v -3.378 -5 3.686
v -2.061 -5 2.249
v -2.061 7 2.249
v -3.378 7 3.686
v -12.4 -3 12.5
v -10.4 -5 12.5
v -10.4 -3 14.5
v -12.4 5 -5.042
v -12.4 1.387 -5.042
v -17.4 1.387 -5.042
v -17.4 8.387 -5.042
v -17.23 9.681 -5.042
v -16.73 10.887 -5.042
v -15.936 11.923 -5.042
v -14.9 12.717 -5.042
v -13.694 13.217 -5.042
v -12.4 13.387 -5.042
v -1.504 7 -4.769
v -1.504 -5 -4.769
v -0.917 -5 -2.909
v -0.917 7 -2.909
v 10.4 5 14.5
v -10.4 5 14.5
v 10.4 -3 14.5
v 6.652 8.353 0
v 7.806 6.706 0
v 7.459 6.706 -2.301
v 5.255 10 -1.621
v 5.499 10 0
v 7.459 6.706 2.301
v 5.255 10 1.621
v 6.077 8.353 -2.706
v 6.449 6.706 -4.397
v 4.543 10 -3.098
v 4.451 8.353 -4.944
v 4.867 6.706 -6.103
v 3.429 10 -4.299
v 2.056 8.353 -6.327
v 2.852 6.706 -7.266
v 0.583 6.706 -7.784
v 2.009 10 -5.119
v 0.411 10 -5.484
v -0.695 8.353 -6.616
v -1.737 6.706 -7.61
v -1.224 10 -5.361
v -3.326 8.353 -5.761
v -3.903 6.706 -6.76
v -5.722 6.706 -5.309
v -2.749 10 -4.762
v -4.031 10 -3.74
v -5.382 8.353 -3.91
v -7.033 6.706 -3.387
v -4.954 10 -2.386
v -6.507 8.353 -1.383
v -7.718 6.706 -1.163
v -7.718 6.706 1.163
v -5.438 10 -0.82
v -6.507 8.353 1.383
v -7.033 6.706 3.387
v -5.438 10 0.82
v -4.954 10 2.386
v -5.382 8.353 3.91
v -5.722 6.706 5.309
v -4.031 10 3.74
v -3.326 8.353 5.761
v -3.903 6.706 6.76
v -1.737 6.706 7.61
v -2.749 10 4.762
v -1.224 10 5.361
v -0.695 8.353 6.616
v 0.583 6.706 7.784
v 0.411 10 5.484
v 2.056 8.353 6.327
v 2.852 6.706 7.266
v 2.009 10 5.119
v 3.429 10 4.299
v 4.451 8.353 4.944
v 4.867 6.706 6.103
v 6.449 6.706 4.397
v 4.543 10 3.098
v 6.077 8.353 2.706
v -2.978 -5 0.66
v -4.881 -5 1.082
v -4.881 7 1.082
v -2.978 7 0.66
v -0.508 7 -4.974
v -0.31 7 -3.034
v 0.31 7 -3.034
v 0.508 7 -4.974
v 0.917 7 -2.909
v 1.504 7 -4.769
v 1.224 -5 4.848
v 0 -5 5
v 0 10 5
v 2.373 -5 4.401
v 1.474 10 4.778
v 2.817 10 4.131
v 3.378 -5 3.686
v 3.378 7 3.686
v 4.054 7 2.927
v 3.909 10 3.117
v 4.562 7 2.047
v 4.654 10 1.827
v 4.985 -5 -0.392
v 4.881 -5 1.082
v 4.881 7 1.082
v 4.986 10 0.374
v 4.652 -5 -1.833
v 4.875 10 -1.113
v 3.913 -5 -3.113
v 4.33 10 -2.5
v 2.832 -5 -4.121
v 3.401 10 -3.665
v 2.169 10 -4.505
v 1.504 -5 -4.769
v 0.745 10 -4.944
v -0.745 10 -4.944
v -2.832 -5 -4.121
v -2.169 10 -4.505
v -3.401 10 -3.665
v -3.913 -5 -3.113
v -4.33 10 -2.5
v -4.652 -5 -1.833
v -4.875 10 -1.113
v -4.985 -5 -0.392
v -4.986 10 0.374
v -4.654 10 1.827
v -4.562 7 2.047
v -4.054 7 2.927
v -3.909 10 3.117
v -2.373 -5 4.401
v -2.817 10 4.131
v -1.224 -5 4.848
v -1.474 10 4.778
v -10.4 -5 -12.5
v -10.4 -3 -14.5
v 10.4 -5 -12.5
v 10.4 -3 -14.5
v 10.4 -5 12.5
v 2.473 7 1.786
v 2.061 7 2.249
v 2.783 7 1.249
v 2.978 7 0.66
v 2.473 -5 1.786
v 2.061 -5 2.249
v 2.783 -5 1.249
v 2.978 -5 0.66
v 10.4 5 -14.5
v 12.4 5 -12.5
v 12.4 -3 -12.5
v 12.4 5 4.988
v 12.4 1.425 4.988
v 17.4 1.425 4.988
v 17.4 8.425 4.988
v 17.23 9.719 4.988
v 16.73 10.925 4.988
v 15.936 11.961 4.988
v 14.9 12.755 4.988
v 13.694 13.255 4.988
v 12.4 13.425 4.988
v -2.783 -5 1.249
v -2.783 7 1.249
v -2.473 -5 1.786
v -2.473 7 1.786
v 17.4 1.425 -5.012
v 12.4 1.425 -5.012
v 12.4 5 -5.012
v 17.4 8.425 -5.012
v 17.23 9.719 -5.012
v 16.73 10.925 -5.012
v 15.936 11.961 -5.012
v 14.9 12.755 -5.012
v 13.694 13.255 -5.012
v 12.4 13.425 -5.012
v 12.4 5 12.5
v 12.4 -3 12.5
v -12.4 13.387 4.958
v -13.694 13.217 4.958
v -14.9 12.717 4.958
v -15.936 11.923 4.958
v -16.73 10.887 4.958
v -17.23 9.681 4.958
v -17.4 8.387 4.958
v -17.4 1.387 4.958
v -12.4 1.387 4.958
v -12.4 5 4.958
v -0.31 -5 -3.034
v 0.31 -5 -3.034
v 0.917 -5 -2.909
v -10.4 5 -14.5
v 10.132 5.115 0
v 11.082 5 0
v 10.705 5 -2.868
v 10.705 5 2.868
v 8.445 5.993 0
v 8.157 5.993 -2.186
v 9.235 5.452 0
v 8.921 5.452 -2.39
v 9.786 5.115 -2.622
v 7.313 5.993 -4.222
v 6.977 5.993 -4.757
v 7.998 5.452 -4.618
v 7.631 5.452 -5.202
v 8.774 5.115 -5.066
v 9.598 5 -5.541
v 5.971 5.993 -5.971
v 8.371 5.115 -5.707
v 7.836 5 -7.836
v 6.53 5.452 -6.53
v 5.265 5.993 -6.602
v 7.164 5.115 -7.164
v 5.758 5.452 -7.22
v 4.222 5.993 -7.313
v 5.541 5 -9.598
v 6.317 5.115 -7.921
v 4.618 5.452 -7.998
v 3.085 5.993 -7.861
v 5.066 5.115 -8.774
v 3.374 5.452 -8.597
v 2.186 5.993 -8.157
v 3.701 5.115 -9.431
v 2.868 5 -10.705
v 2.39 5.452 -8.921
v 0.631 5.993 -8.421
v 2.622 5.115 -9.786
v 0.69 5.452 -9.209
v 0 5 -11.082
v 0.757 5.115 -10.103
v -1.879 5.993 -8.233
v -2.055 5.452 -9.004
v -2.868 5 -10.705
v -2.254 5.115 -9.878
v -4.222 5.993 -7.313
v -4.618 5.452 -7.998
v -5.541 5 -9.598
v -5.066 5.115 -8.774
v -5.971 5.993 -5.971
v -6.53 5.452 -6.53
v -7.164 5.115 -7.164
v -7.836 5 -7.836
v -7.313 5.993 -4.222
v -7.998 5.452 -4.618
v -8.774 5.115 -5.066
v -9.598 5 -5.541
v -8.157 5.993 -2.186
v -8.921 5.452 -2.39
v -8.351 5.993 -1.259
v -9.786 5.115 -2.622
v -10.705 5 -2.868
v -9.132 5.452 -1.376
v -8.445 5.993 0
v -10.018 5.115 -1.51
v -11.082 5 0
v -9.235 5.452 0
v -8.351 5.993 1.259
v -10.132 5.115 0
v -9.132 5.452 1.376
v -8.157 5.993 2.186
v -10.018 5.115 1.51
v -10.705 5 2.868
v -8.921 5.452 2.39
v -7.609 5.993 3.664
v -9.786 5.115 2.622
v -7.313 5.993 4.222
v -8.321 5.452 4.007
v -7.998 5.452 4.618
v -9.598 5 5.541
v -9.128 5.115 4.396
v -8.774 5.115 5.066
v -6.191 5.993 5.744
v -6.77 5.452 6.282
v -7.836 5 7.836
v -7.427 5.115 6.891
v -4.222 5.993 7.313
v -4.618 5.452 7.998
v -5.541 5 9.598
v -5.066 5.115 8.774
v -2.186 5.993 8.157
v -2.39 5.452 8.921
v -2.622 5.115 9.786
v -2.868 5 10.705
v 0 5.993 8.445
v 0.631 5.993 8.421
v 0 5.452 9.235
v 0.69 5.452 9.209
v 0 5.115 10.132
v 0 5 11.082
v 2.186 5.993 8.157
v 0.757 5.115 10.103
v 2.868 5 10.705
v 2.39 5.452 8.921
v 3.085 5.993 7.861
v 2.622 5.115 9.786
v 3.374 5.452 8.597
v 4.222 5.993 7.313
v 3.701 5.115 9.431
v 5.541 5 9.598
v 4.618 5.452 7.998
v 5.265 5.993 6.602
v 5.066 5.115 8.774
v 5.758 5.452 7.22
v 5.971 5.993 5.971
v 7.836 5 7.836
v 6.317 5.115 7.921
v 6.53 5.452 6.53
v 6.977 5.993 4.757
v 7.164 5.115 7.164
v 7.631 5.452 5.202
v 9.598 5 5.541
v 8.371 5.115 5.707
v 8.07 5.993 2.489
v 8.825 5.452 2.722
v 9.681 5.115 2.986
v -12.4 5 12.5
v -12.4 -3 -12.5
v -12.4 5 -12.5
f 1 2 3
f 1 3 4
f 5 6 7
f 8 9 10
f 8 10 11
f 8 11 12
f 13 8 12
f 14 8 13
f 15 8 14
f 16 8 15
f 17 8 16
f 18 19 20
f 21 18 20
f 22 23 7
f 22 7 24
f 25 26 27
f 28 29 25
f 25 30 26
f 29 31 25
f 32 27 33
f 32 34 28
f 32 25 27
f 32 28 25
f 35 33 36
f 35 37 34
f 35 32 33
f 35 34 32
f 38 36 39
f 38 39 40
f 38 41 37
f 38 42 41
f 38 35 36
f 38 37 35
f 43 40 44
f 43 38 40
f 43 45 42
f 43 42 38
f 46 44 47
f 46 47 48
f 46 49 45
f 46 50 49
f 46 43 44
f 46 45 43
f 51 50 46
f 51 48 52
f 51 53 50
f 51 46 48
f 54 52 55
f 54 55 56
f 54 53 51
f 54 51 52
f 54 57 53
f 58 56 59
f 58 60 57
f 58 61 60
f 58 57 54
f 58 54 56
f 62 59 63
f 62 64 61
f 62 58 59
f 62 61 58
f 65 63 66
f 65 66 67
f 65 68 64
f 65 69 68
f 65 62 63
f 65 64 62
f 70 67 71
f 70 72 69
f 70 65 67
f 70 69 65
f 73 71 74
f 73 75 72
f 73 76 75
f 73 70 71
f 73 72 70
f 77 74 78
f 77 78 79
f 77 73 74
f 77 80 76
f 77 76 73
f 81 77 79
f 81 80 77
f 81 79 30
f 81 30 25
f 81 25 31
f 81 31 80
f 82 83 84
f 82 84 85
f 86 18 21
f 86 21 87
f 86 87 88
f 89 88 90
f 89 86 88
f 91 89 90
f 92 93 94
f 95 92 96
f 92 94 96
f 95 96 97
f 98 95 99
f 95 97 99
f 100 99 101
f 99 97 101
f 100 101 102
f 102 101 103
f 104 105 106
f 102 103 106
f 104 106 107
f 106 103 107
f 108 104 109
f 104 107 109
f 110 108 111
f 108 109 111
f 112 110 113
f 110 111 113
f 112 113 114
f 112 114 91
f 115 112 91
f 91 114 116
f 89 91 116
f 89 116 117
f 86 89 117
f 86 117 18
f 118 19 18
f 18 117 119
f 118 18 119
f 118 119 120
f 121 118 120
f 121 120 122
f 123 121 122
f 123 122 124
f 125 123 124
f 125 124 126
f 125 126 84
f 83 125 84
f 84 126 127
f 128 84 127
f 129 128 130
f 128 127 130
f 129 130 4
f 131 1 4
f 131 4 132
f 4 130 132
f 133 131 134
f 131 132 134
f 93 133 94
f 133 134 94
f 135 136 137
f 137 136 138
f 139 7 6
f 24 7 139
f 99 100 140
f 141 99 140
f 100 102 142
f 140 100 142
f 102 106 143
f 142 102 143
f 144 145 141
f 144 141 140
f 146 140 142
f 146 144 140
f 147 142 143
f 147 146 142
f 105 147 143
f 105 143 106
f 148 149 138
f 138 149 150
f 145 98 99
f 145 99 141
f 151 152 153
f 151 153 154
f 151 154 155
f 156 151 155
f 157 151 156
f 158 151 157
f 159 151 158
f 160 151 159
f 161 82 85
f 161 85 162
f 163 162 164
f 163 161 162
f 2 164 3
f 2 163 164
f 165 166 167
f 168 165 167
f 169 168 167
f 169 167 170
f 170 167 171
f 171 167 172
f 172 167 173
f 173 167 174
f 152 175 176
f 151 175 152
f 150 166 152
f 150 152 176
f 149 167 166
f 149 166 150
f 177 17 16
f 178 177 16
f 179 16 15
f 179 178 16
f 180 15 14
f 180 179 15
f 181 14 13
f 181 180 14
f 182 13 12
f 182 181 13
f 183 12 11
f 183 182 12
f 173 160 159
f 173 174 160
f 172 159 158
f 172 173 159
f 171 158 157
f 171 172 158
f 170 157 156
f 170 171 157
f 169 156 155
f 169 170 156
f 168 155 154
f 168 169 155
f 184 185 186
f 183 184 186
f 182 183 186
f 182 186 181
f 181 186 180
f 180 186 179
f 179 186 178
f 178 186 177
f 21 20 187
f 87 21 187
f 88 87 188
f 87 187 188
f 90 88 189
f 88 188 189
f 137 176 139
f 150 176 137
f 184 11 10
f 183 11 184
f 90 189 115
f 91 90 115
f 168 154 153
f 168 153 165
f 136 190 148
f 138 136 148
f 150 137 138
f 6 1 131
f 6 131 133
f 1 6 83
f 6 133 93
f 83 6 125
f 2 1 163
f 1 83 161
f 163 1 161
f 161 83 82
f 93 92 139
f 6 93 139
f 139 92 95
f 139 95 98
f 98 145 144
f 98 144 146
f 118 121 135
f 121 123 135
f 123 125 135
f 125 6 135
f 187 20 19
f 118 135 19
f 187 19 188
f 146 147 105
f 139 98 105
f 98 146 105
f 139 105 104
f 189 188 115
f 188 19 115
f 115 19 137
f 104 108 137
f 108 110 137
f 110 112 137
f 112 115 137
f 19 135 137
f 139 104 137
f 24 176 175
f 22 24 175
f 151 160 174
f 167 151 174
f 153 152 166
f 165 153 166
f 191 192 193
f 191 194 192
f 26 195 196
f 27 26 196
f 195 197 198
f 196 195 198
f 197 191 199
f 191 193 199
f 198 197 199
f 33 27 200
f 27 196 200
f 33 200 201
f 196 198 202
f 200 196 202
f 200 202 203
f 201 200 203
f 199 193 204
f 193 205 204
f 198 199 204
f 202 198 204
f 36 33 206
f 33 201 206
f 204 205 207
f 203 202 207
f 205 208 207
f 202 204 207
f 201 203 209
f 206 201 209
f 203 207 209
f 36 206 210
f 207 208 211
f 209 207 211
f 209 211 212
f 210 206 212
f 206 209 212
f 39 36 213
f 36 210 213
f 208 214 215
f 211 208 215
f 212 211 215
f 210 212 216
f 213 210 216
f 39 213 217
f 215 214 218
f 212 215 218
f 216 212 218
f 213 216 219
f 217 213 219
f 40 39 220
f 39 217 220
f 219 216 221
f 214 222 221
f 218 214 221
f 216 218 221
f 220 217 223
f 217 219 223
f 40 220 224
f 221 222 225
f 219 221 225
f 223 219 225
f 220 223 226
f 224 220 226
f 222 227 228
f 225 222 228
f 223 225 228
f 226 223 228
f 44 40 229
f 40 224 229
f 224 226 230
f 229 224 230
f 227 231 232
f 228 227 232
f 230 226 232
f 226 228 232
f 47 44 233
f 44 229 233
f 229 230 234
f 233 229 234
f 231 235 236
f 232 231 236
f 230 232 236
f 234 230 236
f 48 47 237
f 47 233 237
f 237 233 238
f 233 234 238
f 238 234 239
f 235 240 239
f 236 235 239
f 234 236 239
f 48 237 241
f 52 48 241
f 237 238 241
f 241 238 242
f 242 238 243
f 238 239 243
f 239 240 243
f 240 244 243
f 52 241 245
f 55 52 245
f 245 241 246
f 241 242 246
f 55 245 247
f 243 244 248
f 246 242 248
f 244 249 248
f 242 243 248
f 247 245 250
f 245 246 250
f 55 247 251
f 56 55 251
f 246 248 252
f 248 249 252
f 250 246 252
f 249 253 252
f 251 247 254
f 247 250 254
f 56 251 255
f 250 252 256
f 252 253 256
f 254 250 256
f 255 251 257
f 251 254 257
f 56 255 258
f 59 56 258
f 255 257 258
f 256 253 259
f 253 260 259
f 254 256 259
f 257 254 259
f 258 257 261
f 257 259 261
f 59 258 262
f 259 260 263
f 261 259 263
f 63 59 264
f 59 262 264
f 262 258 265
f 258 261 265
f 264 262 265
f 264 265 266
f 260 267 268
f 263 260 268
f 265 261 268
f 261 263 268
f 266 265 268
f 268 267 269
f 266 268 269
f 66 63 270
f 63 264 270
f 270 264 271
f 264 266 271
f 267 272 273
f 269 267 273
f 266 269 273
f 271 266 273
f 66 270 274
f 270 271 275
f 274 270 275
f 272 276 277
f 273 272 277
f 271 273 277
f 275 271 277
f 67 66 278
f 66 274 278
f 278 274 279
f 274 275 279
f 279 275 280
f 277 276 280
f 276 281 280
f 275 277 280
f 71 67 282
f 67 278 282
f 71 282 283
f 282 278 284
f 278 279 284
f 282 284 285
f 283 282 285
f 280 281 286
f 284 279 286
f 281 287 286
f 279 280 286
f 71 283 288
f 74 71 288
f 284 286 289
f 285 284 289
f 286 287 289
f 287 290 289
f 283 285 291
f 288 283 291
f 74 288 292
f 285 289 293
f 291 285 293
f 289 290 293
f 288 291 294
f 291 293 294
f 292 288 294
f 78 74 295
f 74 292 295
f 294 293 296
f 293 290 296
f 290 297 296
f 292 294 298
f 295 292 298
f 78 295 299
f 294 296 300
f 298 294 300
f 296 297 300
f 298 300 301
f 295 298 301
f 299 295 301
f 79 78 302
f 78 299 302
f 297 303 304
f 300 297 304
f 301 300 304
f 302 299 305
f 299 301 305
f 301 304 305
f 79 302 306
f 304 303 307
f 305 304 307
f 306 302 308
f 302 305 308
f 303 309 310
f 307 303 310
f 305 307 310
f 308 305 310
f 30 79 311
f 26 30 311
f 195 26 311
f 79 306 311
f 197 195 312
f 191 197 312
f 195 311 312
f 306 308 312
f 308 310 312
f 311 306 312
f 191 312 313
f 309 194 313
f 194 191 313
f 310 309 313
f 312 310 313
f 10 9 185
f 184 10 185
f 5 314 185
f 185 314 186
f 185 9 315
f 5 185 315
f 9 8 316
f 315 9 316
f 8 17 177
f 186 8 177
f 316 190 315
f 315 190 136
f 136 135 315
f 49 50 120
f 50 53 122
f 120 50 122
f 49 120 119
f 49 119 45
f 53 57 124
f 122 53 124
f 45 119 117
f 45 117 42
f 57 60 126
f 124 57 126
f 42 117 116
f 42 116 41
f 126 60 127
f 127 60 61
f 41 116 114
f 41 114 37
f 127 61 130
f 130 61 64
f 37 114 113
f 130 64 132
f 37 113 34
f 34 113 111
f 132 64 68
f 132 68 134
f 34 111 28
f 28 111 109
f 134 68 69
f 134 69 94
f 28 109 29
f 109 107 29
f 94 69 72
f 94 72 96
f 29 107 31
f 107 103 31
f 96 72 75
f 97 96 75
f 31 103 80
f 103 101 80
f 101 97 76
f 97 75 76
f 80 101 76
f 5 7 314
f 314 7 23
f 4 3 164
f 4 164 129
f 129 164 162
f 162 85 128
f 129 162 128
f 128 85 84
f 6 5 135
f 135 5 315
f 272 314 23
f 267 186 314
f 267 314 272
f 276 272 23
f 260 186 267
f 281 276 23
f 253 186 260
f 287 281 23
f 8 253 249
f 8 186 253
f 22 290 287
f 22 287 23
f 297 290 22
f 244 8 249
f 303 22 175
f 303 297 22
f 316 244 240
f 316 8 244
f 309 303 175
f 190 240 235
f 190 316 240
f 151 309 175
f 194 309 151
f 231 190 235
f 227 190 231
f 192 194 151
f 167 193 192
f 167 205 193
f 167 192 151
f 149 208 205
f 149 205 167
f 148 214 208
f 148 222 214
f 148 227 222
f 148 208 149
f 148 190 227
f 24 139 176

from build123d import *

# Parameters (mm, degrees)
SKETCH1_W           = 24.8
SKETCH1_H           = 29
BOSS_EXTRUDE1_DEPTH = 5
SKETCH2_R           = 9
BOSS_EXTRUDE2_DEPTH = 5.8
BOSS_EXTRUDE2_TAPER = 35
SKETCH4_R           = 5
CUT_EXTRUDE2_DEPTH  = 25.771959955
BOSS_EXTRUDE3_DEPTH = 12
CHAMFER1_SIZE       = 2
FILLET2_R           = 4
SKETCH6_W           = 30
SKETCH6_H           = 2
CUT_EXTRUDE3_DEPTH  = 34.309452563
SKETCH7_W           = 10
SKETCH7_H           = 12
BOSS_EXTRUDE4_DEPTH = 5
SKETCH9_W           = 10
SKETCH9_H           = 12
BOSS_EXTRUDE5_DEPTH = 5
FILLET3_R           = 5


with BuildPart() as part:
    # Sketch1 → Boss-Extrude1 (new, symmetric)
    with BuildSketch(Plane(origin=(0, 0, 0), x_dir=(1, 0, 0), z_dir=(0, 1, 0))):
        Rectangle(SKETCH1_W, SKETCH1_H)
    extrude(amount=BOSS_EXTRUDE1_DEPTH, both=True)

    # Sketch2 → Boss-Extrude2 (add)
    with BuildSketch(Plane(origin=(0, 5, 0), x_dir=(1, 0, 0), z_dir=(0, 1, 0))):
        Circle(SKETCH2_R)
    extrude(amount=BOSS_EXTRUDE2_DEPTH, taper=BOSS_EXTRUDE2_TAPER)

    # Sketch4 → Cut-Extrude2 (cut, through all)
    with BuildSketch(Plane(origin=(0, 10.8, 0), x_dir=(1, 0, 0), z_dir=(0, 1, 0))):
        with Locations(Location((0, 0, 0), (0, 0, 270))):
            Circle(SKETCH4_R)
    extrude(amount=-CUT_EXTRUDE2_DEPTH, mode=Mode.SUBTRACT)

    # Sketch5 → Boss-Extrude3 (add)
    with BuildSketch(Plane(origin=(0, -5, 0), x_dir=(1, 0, 0), z_dir=(0, 1, 0))):
        with BuildLine():
            Line((-1.533599577, 4.863956449), (-0.917152688, 2.9088367))
            ThreePointArc((-0.917152688, 2.9088367), (0, 3.05), (0.917152688, 2.9088367))
            Line((0.917152688, 2.9088367), (1.533599577, 4.863956449))
            ThreePointArc((1.533599577, 4.863956449), (0, 5.1), (-1.533599577, 4.863956449))
        make_face()
        with BuildLine():
            Line((3.445510059, -3.760114418), (2.060550133, -2.248695877))
            ThreePointArc((2.060550133, -2.248695877), (2.641377482, -1.525), (2.977702822, -0.660140823))
            Line((2.977702822, -0.660140823), (4.979109636, -1.103842031))
            ThreePointArc((4.979109636, -1.103842031), (4.416729559, -2.55), (3.445510059, -3.760114418))
        make_face()
        with BuildLine():
            Line((-4.979109636, -1.103842031), (-2.977702822, -0.660140823))
            ThreePointArc((-2.977702822, -0.660140823), (-2.641377482, -1.525), (-2.060550133, -2.248695877))
            Line((-2.060550133, -2.248695877), (-3.445510059, -3.760114418))
            ThreePointArc((-3.445510059, -3.760114418), (-4.416729559, -2.55), (-4.979109636, -1.103842031))
        make_face()
    extrude(amount=BOSS_EXTRUDE3_DEPTH)

    # Chamfer1
    chamfer1_edges = [part.edges().sort_by_distance(p)[0] for p in [
        (0, -5, 14.5),
        (-12.4, -5, 0),
        (0, -5, -14.5),
        (12.4, -5, 0),
        (12.4, 0, 14.5),
        (-12.4, 0, 14.5),
        (-12.4, 0, -14.5),
        (12.4, 0, -14.5),
    ]]
    chamfer(chamfer1_edges, length=CHAMFER1_SIZE)

    # Fillet2
    fillet2_edges = [part.edges().sort_by_distance(p)[0] for p in [
        (-9, 5, 0),
    ]]
    fillet(fillet2_edges, radius=FILLET2_R)

    # Sketch6 → Cut-Extrude3 (cut, through all)
    with BuildSketch(Plane.XY.offset(14.5)):
        with Locations((0, 11)):
            Rectangle(SKETCH6_W, SKETCH6_H)
    extrude(amount=-CUT_EXTRUDE3_DEPTH, mode=Mode.SUBTRACT)

    # Sketch7 → Boss-Extrude4 (add)
    with BuildSketch(Plane.ZY.offset(12.4)):
        with Locations((-0.042035607, 7.386997459)):
            Rectangle(SKETCH7_W, SKETCH7_H)
    extrude(amount=BOSS_EXTRUDE4_DEPTH)

    # Sketch9 → Boss-Extrude5 (add)
    with BuildSketch(Plane(origin=(12.4, 0, 0), x_dir=(0, 0, -1), z_dir=(1, 0, 0))):
        with Locations((0.01160307, 7.425228999)):
            Rectangle(SKETCH9_W, SKETCH9_H)
    extrude(amount=BOSS_EXTRUDE5_DEPTH)

    # Fillet3
    fillet3_edges = [part.edges().sort_by_distance(p)[0] for p in [
        (17.4, 13.425228999, -0.01160307),
        (-17.4, 13.386997459, -0.042035607),
    ]]
    fillet(fillet3_edges, radius=FILLET3_R - 0.0001)  # a hair under: the kernel refuses the full size


solid = part.part
